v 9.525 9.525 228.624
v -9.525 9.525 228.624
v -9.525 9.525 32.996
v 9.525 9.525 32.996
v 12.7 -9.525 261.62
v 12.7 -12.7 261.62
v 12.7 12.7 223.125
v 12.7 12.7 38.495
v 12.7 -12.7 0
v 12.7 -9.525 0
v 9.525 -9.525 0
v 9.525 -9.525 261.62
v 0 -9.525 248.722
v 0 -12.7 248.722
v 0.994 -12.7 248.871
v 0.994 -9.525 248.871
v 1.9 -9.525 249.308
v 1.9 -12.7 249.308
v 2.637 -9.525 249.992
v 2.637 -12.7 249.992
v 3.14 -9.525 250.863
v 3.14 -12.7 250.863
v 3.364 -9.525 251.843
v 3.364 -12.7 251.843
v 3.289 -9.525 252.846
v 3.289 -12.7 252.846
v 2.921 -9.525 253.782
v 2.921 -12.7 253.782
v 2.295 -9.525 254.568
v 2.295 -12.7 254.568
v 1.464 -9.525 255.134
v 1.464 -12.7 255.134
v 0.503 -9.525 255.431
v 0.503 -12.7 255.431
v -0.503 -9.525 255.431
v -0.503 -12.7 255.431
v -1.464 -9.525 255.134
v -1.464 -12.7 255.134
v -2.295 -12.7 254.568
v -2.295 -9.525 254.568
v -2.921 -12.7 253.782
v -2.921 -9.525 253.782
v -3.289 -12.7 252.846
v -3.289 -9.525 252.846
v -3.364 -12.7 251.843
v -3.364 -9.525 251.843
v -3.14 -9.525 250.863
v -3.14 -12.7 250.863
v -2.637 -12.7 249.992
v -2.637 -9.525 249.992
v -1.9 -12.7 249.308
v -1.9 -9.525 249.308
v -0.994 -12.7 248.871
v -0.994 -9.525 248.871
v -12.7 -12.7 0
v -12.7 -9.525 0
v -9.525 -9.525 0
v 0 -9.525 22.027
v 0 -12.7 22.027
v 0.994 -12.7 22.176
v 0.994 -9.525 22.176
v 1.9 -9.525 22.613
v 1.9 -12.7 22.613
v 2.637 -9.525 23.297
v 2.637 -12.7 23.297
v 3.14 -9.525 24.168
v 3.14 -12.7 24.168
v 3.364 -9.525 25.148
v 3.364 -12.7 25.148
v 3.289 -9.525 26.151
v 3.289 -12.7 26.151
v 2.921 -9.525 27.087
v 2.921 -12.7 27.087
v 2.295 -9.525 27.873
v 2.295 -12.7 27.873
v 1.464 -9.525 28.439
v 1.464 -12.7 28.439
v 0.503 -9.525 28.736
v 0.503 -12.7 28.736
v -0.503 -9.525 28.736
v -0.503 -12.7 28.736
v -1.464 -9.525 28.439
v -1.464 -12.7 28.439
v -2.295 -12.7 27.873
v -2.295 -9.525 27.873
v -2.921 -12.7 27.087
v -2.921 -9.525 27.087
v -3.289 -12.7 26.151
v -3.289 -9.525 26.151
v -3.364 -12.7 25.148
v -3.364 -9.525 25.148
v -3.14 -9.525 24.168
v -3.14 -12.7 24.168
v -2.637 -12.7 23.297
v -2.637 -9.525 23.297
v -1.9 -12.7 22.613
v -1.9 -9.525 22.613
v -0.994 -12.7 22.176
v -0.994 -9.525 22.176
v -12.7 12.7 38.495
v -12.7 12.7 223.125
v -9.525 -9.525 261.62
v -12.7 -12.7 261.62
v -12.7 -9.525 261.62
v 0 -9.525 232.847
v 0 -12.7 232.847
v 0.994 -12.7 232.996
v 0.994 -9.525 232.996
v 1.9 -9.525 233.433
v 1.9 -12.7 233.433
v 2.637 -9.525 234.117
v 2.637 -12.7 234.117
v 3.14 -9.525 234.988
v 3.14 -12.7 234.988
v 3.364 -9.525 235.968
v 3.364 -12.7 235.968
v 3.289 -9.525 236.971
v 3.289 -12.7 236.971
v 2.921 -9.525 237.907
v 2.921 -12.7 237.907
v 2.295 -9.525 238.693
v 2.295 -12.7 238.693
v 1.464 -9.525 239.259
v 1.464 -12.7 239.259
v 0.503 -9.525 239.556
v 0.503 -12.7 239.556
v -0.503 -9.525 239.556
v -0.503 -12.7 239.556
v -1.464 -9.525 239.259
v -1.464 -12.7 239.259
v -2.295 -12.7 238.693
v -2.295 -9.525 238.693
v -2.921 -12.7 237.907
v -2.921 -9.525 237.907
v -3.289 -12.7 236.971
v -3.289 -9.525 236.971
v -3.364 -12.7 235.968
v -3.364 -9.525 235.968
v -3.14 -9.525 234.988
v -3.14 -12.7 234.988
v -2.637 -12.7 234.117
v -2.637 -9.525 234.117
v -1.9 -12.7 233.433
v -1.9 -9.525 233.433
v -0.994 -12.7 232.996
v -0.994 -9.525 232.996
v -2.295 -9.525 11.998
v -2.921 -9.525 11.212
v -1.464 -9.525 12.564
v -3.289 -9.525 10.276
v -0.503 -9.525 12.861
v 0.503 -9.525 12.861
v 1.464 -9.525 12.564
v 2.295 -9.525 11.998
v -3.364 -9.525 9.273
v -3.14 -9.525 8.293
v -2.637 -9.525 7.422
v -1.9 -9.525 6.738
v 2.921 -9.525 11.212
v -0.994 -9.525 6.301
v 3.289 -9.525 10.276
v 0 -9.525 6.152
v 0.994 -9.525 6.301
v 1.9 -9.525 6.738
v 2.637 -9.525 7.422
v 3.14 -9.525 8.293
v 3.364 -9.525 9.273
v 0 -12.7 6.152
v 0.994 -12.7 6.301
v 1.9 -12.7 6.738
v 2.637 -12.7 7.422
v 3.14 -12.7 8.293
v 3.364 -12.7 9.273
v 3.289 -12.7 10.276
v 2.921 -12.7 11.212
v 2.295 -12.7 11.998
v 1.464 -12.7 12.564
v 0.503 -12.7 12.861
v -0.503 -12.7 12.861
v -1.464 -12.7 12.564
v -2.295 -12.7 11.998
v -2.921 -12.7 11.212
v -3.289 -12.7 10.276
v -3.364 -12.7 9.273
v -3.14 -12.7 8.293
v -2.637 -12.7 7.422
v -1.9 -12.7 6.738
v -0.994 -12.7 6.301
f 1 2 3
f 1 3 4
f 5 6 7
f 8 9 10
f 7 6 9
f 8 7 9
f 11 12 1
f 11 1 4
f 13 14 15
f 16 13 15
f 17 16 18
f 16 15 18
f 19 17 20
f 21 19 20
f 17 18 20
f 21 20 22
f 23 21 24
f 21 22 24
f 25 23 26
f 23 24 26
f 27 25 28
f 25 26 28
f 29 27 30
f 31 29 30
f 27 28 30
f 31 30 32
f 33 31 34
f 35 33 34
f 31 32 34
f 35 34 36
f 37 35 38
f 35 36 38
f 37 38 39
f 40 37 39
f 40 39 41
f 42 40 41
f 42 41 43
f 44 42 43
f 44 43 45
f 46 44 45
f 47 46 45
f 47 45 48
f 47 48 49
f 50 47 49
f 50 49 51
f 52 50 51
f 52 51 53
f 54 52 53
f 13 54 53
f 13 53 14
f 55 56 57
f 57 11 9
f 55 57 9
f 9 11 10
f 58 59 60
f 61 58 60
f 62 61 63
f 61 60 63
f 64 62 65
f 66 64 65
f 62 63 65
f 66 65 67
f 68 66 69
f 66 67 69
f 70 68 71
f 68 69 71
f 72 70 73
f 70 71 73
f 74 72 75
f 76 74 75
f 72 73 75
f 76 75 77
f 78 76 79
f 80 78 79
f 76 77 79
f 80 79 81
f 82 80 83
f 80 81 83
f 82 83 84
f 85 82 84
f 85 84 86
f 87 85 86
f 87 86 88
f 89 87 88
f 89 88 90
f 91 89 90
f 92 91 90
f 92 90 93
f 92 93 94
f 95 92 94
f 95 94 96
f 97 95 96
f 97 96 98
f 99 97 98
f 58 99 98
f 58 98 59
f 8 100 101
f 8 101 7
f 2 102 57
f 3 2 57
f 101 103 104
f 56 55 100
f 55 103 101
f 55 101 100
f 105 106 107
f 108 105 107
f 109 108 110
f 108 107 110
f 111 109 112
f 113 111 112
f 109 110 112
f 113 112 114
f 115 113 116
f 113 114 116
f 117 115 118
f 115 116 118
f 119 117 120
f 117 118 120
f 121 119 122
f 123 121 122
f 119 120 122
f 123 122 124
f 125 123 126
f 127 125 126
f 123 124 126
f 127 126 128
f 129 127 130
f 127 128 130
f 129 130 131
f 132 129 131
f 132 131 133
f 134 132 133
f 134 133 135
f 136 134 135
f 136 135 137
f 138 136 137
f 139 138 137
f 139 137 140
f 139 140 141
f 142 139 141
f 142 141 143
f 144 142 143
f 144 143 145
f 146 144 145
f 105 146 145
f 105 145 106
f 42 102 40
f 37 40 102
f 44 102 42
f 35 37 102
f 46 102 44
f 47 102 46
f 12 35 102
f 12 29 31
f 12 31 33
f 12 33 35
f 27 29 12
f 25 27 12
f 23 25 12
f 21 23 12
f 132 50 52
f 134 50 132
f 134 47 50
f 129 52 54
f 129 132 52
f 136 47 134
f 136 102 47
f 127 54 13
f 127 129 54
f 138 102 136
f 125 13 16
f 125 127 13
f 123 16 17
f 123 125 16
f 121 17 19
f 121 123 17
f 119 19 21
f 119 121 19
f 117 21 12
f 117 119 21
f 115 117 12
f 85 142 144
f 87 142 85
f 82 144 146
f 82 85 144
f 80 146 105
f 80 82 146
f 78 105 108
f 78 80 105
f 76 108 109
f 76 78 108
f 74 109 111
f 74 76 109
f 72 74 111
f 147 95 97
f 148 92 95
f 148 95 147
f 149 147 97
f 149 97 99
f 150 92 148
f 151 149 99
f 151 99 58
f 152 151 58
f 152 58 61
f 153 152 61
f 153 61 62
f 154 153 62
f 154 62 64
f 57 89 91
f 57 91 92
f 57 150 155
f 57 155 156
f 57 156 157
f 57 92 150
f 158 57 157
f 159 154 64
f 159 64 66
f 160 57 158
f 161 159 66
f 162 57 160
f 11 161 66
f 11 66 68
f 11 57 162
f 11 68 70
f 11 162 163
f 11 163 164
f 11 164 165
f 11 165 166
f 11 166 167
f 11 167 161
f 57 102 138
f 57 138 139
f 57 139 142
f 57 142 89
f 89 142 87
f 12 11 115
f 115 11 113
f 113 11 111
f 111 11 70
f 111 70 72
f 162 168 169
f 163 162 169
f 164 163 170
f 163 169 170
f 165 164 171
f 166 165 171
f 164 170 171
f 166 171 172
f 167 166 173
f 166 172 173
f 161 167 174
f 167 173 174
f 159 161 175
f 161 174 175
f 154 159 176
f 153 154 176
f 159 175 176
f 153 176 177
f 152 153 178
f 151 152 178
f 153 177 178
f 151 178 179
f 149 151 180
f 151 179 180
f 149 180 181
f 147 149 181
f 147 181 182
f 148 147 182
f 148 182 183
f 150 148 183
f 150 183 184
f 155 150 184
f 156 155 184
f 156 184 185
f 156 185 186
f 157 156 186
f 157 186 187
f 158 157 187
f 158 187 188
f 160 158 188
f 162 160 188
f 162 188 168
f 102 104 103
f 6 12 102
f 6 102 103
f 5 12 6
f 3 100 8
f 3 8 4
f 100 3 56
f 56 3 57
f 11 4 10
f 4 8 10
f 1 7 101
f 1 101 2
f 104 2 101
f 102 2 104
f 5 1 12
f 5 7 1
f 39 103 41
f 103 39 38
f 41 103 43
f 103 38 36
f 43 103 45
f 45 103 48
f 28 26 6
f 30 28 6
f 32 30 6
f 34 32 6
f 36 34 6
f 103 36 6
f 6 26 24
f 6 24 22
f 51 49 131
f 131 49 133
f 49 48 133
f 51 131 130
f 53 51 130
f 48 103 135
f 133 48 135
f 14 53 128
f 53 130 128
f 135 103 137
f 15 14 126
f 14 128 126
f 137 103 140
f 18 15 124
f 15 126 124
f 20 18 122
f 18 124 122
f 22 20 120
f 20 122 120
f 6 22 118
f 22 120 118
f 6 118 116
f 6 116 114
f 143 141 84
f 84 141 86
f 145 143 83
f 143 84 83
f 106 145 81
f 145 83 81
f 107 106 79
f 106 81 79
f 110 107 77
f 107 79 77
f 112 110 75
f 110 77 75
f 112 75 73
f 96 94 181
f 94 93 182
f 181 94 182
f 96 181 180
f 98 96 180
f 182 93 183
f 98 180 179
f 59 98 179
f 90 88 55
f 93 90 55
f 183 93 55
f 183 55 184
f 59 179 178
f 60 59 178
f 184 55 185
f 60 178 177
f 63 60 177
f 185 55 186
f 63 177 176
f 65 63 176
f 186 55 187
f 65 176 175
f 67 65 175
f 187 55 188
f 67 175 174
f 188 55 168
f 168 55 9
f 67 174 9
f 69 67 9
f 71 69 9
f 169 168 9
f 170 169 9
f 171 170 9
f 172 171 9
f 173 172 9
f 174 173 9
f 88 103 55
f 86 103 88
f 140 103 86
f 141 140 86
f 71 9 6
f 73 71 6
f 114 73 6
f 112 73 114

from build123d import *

# Parameters (mm, degrees)
SKETCH1_W           = 25.4
SKETCH1_H           = 25.4
SKETCH1_W_2         = 19.05
SKETCH1_H_2         = 19.05
BOSS_EXTRUDE1_DEPTH = 261.62
CUT_EXTRUDE2_DEPTH  = 264.156748726
SKETCH3_R           = 3.3734375
CUT_EXTRUDE3_DEPTH  = 264.156748726


with BuildPart() as part:
    # Sketch1 → Boss-Extrude1 (new body)
    with BuildSketch(Plane.XY):
        Rectangle(SKETCH1_W, SKETCH1_H)
        Rectangle(SKETCH1_W_2, SKETCH1_H_2, mode=Mode.SUBTRACT)
    extrude(amount=BOSS_EXTRUDE1_DEPTH)

    # Sketch2 → Cut-Extrude2 (cut, through all)
    with BuildSketch(Plane(origin=(12.7, 0, 0), x_dir=(0, 0, -1), z_dir=(1, 0, 0))):
        Polygon((-223.125170802, 12.7), (-261.62, -9.525), (-261.62, 12.7), align=None)
        Polygon((-38.494829198, 12.7), (0, -9.525), (0, 12.7), align=None)
    extrude(amount=-CUT_EXTRUDE2_DEPTH, mode=Mode.SUBTRACT)

    # Sketch3 → Cut-Extrude3 (cut, through all)
    with BuildSketch(Plane.XZ.offset(12.7)):
        with Locations(Location((0, 252.095, 0), (0, 0, 270))):
            Circle(SKETCH3_R)
        with Locations(Location((0, 236.22, 0), (0, 0, 270))):
            Circle(SKETCH3_R)
        with Locations(Location((0, 25.4, 0), (0, 0, 270))):
            Circle(SKETCH3_R)
        with Locations(Location((0, 9.525, 0), (0, 0, 270))):
            Circle(SKETCH3_R)
    extrude(amount=-CUT_EXTRUDE3_DEPTH, mode=Mode.SUBTRACT)


solid = part.part
